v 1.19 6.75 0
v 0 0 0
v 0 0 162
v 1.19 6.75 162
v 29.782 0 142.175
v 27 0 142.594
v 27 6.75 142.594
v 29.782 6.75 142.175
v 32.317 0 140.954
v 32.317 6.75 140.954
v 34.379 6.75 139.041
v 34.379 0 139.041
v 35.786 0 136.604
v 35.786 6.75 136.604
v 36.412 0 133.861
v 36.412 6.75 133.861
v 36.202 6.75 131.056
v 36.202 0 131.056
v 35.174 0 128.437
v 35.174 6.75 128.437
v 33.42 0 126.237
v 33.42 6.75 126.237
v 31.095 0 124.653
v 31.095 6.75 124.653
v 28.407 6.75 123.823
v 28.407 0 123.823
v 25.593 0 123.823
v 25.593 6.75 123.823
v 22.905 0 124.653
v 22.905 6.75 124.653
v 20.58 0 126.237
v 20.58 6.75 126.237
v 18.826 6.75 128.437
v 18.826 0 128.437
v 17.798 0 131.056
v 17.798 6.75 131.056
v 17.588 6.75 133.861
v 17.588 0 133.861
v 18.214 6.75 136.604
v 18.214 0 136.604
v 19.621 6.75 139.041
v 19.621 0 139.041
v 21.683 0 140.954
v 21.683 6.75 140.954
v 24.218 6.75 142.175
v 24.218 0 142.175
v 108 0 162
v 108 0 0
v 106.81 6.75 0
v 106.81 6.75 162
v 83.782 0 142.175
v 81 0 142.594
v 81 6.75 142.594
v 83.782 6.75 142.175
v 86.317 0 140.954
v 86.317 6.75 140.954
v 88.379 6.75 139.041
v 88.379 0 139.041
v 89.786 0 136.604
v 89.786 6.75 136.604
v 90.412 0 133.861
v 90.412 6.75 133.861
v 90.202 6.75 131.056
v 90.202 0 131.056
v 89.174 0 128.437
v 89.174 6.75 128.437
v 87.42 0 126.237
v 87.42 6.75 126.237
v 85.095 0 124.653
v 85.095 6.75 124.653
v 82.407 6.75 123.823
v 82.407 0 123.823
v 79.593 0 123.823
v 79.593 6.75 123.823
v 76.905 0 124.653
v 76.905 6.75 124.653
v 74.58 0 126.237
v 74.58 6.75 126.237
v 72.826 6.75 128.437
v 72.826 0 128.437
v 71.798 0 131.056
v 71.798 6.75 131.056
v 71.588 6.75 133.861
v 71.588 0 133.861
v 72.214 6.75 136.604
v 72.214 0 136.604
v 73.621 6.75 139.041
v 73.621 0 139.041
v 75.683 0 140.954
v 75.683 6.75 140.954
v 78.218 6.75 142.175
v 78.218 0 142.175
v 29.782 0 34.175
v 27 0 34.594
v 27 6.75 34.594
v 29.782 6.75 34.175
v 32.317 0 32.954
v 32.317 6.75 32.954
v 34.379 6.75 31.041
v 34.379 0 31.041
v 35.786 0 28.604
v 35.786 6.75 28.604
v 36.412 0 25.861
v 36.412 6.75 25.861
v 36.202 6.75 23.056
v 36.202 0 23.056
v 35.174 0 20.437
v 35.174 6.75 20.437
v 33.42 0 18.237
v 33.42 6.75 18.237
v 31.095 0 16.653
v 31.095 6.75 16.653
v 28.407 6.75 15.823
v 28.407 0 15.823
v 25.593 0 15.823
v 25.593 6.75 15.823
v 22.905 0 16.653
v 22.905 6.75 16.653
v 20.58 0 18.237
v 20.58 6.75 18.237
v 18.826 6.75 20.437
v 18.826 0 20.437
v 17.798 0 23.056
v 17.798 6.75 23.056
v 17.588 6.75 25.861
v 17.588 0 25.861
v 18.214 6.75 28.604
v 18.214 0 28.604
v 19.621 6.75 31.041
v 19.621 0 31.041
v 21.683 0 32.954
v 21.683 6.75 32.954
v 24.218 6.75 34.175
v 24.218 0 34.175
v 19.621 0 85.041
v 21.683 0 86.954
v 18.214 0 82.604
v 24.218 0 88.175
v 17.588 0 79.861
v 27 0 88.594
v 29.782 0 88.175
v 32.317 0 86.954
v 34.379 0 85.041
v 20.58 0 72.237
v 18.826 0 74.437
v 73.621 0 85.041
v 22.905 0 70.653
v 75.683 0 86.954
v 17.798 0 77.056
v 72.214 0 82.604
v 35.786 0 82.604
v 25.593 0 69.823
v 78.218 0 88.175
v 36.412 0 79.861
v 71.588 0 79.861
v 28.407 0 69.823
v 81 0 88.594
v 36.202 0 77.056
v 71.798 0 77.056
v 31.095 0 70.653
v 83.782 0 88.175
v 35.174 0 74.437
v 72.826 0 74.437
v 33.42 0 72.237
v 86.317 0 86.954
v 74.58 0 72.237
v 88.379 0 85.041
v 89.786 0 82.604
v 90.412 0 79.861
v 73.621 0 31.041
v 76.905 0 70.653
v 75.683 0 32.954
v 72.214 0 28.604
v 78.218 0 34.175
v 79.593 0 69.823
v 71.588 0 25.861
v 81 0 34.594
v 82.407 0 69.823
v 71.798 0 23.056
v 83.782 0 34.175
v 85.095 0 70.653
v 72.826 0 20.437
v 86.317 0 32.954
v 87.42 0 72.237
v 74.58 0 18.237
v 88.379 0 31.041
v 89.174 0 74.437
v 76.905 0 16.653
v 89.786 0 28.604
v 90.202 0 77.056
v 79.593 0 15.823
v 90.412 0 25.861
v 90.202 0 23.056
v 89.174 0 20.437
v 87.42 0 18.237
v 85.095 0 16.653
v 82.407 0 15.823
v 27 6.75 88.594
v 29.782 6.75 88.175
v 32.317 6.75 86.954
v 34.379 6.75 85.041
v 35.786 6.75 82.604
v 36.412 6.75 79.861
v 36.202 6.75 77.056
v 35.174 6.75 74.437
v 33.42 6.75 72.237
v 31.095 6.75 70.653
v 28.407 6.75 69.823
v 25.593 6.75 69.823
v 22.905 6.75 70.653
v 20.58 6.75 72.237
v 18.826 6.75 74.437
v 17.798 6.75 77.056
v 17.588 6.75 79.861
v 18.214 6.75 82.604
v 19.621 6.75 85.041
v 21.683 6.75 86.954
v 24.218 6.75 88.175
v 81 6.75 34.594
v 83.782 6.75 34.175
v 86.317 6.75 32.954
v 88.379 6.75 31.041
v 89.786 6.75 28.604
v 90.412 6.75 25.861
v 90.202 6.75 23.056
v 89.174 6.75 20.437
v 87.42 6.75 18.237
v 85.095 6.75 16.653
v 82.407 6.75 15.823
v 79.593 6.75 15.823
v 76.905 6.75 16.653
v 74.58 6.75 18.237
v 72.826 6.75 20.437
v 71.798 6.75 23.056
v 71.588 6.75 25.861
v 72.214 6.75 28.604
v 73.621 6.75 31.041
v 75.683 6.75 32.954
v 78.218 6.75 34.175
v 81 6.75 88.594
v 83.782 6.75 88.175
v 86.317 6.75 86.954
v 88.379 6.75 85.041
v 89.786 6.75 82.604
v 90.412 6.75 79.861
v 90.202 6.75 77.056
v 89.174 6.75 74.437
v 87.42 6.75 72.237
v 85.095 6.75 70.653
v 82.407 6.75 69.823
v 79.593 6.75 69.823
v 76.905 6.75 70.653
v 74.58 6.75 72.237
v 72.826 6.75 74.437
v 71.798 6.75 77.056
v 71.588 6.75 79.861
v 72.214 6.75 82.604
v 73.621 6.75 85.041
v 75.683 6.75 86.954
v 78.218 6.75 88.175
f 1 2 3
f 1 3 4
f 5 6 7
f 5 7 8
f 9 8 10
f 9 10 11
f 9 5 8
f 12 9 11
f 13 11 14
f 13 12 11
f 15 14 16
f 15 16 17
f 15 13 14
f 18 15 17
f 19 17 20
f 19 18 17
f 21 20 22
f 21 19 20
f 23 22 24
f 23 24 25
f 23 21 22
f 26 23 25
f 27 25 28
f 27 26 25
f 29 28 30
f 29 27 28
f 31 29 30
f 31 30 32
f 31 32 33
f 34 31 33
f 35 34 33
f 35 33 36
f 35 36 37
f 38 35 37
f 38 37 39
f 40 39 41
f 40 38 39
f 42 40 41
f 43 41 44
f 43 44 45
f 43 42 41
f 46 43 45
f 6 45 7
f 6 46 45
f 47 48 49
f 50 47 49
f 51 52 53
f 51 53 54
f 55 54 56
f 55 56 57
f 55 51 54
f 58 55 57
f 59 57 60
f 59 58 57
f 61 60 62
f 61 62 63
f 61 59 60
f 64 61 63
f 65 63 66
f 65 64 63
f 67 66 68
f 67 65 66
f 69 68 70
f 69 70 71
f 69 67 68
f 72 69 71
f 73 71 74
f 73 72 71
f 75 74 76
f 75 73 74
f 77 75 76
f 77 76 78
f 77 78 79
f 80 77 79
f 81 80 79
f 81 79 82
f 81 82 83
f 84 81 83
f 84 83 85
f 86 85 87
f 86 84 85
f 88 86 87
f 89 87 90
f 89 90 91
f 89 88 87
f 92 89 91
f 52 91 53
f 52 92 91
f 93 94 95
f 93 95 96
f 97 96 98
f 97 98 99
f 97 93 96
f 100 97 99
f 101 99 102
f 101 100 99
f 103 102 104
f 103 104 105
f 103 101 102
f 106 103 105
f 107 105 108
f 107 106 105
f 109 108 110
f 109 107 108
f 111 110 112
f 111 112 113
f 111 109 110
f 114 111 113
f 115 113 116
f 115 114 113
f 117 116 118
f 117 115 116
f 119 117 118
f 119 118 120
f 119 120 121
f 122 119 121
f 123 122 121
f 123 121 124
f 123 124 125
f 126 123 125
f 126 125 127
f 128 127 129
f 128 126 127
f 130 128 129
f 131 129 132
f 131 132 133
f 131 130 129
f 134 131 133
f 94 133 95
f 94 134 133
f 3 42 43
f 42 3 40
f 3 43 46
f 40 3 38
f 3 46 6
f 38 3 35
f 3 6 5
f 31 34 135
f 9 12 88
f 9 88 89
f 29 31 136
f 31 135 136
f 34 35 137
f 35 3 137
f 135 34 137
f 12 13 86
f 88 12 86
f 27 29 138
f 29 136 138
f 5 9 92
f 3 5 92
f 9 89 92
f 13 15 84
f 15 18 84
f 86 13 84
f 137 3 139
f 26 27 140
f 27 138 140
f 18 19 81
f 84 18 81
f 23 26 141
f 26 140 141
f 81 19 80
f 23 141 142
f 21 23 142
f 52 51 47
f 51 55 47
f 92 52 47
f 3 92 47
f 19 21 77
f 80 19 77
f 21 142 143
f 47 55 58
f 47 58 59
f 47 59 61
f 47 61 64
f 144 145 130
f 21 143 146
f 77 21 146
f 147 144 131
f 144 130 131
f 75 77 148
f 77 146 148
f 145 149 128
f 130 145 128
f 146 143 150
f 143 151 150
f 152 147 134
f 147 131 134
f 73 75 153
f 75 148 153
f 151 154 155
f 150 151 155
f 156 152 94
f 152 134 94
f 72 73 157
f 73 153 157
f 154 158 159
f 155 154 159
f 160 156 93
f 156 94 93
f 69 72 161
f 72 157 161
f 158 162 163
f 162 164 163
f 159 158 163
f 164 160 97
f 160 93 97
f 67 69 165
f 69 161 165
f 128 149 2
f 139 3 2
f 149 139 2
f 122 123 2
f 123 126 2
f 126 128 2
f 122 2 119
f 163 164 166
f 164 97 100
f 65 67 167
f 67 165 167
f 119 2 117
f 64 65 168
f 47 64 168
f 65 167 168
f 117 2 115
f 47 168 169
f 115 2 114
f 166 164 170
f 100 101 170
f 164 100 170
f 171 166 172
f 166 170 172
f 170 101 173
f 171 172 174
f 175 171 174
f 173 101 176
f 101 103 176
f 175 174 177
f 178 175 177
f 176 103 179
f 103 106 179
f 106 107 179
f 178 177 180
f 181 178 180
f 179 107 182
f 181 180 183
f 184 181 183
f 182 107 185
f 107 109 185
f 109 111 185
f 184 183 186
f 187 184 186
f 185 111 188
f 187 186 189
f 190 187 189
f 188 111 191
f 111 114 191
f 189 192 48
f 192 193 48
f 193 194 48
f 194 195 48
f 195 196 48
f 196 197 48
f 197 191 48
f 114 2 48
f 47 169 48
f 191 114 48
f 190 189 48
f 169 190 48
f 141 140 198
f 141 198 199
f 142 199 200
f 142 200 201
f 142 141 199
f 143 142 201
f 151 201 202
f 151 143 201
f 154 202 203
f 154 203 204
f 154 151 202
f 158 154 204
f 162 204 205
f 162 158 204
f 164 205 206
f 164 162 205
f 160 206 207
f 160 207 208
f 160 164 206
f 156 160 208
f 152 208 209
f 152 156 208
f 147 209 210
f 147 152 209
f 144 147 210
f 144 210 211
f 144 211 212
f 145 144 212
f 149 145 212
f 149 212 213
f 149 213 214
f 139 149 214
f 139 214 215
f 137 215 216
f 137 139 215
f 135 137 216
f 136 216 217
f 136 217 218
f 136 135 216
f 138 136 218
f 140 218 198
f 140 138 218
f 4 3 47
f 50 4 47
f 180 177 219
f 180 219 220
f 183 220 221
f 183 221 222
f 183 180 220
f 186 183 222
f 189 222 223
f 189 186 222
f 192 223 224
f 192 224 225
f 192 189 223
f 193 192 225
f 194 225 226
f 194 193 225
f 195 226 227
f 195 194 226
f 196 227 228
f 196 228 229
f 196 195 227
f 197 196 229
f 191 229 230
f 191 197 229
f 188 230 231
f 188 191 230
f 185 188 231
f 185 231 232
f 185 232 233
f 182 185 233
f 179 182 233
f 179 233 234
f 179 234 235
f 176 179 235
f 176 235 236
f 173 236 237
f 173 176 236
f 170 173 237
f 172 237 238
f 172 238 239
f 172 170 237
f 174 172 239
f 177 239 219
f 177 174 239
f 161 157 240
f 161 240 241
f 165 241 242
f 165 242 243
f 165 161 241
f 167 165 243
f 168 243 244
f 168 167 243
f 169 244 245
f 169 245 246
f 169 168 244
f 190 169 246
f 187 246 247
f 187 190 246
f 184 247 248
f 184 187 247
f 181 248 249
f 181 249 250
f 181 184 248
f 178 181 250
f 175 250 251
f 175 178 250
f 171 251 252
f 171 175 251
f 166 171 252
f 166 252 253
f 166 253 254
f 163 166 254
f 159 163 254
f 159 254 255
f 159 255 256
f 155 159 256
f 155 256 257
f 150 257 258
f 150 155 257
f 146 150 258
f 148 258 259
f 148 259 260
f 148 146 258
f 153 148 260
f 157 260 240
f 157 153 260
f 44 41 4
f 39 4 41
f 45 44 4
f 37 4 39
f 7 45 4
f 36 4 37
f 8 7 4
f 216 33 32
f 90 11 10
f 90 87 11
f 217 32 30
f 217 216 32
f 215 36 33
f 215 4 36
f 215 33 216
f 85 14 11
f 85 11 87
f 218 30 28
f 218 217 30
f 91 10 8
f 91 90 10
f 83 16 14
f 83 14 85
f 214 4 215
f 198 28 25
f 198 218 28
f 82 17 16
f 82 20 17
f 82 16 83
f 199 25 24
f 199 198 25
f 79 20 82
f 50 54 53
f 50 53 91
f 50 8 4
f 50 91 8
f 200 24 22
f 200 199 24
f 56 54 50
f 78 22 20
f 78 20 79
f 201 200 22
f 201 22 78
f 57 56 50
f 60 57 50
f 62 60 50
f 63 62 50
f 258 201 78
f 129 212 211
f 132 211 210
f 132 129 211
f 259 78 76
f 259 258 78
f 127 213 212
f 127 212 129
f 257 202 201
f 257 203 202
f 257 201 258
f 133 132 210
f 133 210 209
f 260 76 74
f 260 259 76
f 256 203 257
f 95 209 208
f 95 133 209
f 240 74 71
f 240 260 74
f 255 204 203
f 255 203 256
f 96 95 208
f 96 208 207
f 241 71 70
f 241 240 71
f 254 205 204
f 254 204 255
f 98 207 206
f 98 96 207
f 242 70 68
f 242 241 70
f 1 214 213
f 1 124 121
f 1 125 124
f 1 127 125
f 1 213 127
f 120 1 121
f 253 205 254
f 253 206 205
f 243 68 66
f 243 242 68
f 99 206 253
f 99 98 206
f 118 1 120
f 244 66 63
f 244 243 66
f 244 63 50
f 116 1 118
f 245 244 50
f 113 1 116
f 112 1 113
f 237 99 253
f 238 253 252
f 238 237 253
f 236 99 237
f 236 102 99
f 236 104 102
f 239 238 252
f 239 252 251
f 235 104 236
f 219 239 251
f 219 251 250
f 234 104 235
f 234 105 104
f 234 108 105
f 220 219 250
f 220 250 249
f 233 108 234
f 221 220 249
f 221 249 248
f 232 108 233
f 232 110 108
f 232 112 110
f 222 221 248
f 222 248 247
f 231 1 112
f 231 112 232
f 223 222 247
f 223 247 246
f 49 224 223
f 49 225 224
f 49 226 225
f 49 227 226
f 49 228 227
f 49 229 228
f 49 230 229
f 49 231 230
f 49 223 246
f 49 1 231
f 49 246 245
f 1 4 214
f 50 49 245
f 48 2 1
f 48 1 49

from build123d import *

# Parameters (mm, degrees)
SKETCH1_W                = 108
SKETCH1_H                = 162
SKETCH1_R                = 9.438144972
BOSS_EXTRUDE1_DEPTH      = 6.75
CUT_EXTRUDE16_DEPTH      = 500
CUT_EXTRUDE16_DEPTH_BACK = 6.75


with BuildPart() as part:
    # Sketch1 → Boss-Extrude1 (new body)
    with BuildSketch(Plane(origin=(0, 0, 0), x_dir=(1, 0, 0), z_dir=(0, 1, 0))):
        with Locations((54, -81)):
            Rectangle(SKETCH1_W, SKETCH1_H)
        with Locations(Location((27, -133.156149589, 0), (0, 0, 270))):
            Circle(SKETCH1_R, mode=Mode.SUBTRACT)
        with Locations(Location((81, -133.156149589, 0), (0, 0, 270))):
            Circle(SKETCH1_R, mode=Mode.SUBTRACT)
        with Locations(Location((81, -79.156149589, 0), (0, 0, 270))):
            Circle(SKETCH1_R, mode=Mode.SUBTRACT)
        with Locations(Location((81, -25.156149589, 0), (0, 0, 270))):
            Circle(SKETCH1_R, mode=Mode.SUBTRACT)
        with Locations(Location((27, -79.156149589, 0), (0, 0, 270))):
            Circle(SKETCH1_R, mode=Mode.SUBTRACT)
        with Locations(Location((27, -25.156149589, 0), (0, 0, 270))):
            Circle(SKETCH1_R, mode=Mode.SUBTRACT)
    extrude(amount=BOSS_EXTRUDE1_DEPTH)

    # Sketch2 → Cut-Extrude16 (cut, two sides: drawn at the far end of the back side and taken through both)
    with BuildSketch(Plane.XY.offset(-CUT_EXTRUDE16_DEPTH_BACK)):
        Polygon((0, 6.75), (0, 0), (1.19020712, 6.75), align=None)
        Polygon((108, 6.75), (108, 0), (106.80979288, 6.75), align=None)
    extrude(amount=CUT_EXTRUDE16_DEPTH + CUT_EXTRUDE16_DEPTH_BACK, mode=Mode.SUBTRACT)


solid = part.part
